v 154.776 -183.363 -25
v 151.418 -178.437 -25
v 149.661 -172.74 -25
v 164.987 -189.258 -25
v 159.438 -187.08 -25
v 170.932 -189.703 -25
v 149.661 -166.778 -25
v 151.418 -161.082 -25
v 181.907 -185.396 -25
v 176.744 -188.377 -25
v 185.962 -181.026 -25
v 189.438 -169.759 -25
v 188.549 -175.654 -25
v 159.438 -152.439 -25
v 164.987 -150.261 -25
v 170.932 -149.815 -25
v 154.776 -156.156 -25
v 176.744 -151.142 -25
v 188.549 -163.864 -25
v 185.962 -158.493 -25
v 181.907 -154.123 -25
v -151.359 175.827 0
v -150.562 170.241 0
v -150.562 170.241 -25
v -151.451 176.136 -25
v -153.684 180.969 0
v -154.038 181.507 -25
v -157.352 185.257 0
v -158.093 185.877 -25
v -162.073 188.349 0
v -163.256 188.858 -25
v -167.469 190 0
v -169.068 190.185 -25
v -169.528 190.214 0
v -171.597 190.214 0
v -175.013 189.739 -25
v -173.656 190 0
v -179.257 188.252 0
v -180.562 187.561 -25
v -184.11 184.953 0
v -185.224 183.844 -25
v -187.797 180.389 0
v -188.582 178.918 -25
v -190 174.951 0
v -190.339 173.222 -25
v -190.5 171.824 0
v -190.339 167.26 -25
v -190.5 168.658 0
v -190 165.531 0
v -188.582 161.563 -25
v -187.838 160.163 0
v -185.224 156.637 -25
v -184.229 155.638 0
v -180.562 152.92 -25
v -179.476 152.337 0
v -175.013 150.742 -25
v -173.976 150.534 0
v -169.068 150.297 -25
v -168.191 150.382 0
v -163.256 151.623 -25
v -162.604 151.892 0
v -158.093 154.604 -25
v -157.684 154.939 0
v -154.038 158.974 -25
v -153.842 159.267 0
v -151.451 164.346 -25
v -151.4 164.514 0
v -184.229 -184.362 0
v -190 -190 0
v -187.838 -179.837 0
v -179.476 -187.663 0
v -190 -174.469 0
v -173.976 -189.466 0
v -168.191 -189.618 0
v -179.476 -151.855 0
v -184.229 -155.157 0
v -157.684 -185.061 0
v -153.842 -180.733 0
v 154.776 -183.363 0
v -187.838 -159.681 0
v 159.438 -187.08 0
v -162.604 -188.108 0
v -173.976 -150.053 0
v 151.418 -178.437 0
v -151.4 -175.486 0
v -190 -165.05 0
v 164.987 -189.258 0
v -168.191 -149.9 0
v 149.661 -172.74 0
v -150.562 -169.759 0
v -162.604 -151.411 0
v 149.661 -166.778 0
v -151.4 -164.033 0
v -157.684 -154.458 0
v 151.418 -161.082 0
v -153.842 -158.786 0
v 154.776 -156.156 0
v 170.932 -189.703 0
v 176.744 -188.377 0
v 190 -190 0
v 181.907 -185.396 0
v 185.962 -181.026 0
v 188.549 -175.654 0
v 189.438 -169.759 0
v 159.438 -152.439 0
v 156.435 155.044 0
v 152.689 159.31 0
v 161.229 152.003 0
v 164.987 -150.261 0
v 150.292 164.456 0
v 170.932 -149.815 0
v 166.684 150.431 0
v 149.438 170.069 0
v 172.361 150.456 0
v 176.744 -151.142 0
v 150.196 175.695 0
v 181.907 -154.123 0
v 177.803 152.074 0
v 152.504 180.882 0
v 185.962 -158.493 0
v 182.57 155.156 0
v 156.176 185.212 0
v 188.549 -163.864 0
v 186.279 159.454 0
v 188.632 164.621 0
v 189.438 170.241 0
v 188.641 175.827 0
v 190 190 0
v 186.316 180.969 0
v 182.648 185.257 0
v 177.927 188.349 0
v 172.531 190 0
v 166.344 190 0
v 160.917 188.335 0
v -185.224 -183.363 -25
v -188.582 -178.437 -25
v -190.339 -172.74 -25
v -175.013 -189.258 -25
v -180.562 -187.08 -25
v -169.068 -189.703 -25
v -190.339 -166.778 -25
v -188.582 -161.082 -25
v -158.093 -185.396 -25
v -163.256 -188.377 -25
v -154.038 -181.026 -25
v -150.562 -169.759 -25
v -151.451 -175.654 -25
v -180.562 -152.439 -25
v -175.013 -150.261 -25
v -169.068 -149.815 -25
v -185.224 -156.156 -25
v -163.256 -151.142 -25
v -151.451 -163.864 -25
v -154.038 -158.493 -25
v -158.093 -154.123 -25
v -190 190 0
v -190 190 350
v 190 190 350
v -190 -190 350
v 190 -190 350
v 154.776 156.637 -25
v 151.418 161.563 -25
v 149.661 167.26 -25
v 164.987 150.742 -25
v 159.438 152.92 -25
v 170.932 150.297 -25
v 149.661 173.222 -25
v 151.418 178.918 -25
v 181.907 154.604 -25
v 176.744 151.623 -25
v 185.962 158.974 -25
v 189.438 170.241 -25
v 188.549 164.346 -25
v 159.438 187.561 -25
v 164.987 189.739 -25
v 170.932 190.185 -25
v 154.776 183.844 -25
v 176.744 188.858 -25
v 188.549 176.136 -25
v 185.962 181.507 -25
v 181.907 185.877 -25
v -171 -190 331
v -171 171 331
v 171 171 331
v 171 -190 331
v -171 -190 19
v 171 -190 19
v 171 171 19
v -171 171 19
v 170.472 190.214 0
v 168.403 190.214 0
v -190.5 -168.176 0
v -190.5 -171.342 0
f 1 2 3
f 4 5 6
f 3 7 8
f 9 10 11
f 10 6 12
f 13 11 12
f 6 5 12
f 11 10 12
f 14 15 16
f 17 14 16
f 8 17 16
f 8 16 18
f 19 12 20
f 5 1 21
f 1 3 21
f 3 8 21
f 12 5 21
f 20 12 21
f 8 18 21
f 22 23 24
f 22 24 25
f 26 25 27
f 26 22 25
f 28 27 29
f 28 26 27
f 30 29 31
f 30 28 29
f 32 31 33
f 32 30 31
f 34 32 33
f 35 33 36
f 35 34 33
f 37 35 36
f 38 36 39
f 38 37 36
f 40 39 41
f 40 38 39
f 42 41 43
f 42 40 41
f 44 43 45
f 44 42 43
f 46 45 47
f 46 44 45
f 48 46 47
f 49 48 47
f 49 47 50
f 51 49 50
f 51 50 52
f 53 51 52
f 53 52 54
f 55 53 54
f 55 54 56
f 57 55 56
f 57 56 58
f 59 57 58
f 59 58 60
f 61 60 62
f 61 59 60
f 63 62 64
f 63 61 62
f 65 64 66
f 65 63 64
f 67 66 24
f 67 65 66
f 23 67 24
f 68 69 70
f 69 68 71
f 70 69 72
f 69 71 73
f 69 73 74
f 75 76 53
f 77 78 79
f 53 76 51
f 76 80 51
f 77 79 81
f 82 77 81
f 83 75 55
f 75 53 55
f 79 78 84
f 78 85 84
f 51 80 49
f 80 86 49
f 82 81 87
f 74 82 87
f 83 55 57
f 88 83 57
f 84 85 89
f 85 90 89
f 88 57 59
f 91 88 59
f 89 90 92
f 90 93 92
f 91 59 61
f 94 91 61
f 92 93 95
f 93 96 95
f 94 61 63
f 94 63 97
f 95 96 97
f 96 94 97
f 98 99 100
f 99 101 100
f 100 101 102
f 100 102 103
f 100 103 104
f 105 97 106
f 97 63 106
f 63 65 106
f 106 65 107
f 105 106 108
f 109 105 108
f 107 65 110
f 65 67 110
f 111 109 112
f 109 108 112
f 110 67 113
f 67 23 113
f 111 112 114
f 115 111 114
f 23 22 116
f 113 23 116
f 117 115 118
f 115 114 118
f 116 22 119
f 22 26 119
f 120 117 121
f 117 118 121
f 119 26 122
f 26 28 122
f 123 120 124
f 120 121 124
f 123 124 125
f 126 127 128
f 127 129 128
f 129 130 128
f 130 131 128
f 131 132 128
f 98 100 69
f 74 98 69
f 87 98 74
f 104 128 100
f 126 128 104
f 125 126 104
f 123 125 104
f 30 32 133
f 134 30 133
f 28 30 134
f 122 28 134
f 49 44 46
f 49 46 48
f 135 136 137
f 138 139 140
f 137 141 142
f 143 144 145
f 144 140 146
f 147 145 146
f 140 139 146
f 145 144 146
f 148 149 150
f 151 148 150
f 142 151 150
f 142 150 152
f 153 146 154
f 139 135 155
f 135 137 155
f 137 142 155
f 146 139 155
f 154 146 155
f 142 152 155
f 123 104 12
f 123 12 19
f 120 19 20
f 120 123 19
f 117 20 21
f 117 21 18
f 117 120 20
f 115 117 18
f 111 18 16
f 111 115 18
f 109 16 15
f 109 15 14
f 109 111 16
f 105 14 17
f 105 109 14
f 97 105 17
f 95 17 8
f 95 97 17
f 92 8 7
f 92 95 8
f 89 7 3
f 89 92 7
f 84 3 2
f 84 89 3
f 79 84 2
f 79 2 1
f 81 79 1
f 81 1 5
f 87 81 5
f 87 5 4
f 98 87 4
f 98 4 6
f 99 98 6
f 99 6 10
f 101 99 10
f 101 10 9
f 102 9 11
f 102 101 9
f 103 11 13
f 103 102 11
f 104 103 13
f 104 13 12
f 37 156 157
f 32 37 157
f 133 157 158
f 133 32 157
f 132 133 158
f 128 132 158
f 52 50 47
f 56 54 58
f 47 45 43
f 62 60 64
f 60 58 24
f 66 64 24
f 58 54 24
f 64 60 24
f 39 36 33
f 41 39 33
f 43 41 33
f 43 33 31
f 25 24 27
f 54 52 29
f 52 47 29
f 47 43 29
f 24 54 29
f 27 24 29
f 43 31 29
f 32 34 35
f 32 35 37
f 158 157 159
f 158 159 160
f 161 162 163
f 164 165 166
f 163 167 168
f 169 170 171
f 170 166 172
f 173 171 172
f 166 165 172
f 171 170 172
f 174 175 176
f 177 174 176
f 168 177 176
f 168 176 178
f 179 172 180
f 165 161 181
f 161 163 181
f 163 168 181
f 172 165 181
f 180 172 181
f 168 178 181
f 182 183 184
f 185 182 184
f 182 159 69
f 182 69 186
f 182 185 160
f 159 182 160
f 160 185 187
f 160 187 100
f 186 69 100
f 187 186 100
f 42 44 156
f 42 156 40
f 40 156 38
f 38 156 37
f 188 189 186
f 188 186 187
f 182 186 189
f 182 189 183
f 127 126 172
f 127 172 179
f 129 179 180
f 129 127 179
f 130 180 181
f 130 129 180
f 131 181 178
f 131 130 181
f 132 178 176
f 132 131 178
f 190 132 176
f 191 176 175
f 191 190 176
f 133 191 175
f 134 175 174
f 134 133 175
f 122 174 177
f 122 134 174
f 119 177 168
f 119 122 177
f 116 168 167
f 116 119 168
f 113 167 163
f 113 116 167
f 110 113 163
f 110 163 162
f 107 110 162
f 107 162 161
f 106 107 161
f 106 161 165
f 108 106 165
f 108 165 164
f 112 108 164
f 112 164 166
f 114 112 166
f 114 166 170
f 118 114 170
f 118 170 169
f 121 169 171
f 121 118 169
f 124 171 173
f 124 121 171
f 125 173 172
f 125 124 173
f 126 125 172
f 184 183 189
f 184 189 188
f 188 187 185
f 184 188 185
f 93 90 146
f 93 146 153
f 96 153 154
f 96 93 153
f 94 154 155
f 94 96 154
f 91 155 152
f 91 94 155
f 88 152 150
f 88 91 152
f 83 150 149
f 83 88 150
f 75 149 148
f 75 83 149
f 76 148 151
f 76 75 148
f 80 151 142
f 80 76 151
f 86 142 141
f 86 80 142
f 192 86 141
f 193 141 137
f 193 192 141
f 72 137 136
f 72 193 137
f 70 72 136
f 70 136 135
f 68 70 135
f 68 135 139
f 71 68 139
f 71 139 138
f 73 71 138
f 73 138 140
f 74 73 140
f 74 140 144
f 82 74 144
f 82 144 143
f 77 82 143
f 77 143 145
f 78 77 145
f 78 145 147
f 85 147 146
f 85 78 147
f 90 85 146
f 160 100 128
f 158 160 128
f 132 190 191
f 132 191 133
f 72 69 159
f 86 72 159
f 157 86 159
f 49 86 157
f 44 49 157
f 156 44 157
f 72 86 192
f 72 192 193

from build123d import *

# Parameters (mm, degrees)
F0_W     = 380
F0_H     = 380
F1_DEPTH = 350
F2_W     = 342
F2_H     = 312
F3_DEPTH = 361
F4_R     = 20
F5_DEPTH = 25


with BuildPart() as f1:
    # F0 (on Top) → F1 (new body)
    with BuildSketch(Plane.XY):
        Rectangle(F0_W, F0_H)
    extrude(amount=F1_DEPTH)

    # F2 (on face) → F3 (cut)
    with BuildSketch(Plane.XZ.offset(190)):
        with Locations((0, 175)):
            Rectangle(F2_W, F2_H)
    extrude(amount=-F3_DEPTH, mode=Mode.SUBTRACT)

    # F4 (on face) → F5 (join)
    with BuildSketch(Plane.XY):
        with Locations((169.437533, -169.759312)):
            Circle(F4_R)
        with Locations((169.437532, 170.240688)):
            Circle(F4_R)
        with Locations((-170.562468, 170.240687)):
            Circle(F4_R)
        with Locations((-170.562467, -169.759313)):
            Circle(F4_R)
    extrude(amount=-F5_DEPTH)


solid = f1.part
